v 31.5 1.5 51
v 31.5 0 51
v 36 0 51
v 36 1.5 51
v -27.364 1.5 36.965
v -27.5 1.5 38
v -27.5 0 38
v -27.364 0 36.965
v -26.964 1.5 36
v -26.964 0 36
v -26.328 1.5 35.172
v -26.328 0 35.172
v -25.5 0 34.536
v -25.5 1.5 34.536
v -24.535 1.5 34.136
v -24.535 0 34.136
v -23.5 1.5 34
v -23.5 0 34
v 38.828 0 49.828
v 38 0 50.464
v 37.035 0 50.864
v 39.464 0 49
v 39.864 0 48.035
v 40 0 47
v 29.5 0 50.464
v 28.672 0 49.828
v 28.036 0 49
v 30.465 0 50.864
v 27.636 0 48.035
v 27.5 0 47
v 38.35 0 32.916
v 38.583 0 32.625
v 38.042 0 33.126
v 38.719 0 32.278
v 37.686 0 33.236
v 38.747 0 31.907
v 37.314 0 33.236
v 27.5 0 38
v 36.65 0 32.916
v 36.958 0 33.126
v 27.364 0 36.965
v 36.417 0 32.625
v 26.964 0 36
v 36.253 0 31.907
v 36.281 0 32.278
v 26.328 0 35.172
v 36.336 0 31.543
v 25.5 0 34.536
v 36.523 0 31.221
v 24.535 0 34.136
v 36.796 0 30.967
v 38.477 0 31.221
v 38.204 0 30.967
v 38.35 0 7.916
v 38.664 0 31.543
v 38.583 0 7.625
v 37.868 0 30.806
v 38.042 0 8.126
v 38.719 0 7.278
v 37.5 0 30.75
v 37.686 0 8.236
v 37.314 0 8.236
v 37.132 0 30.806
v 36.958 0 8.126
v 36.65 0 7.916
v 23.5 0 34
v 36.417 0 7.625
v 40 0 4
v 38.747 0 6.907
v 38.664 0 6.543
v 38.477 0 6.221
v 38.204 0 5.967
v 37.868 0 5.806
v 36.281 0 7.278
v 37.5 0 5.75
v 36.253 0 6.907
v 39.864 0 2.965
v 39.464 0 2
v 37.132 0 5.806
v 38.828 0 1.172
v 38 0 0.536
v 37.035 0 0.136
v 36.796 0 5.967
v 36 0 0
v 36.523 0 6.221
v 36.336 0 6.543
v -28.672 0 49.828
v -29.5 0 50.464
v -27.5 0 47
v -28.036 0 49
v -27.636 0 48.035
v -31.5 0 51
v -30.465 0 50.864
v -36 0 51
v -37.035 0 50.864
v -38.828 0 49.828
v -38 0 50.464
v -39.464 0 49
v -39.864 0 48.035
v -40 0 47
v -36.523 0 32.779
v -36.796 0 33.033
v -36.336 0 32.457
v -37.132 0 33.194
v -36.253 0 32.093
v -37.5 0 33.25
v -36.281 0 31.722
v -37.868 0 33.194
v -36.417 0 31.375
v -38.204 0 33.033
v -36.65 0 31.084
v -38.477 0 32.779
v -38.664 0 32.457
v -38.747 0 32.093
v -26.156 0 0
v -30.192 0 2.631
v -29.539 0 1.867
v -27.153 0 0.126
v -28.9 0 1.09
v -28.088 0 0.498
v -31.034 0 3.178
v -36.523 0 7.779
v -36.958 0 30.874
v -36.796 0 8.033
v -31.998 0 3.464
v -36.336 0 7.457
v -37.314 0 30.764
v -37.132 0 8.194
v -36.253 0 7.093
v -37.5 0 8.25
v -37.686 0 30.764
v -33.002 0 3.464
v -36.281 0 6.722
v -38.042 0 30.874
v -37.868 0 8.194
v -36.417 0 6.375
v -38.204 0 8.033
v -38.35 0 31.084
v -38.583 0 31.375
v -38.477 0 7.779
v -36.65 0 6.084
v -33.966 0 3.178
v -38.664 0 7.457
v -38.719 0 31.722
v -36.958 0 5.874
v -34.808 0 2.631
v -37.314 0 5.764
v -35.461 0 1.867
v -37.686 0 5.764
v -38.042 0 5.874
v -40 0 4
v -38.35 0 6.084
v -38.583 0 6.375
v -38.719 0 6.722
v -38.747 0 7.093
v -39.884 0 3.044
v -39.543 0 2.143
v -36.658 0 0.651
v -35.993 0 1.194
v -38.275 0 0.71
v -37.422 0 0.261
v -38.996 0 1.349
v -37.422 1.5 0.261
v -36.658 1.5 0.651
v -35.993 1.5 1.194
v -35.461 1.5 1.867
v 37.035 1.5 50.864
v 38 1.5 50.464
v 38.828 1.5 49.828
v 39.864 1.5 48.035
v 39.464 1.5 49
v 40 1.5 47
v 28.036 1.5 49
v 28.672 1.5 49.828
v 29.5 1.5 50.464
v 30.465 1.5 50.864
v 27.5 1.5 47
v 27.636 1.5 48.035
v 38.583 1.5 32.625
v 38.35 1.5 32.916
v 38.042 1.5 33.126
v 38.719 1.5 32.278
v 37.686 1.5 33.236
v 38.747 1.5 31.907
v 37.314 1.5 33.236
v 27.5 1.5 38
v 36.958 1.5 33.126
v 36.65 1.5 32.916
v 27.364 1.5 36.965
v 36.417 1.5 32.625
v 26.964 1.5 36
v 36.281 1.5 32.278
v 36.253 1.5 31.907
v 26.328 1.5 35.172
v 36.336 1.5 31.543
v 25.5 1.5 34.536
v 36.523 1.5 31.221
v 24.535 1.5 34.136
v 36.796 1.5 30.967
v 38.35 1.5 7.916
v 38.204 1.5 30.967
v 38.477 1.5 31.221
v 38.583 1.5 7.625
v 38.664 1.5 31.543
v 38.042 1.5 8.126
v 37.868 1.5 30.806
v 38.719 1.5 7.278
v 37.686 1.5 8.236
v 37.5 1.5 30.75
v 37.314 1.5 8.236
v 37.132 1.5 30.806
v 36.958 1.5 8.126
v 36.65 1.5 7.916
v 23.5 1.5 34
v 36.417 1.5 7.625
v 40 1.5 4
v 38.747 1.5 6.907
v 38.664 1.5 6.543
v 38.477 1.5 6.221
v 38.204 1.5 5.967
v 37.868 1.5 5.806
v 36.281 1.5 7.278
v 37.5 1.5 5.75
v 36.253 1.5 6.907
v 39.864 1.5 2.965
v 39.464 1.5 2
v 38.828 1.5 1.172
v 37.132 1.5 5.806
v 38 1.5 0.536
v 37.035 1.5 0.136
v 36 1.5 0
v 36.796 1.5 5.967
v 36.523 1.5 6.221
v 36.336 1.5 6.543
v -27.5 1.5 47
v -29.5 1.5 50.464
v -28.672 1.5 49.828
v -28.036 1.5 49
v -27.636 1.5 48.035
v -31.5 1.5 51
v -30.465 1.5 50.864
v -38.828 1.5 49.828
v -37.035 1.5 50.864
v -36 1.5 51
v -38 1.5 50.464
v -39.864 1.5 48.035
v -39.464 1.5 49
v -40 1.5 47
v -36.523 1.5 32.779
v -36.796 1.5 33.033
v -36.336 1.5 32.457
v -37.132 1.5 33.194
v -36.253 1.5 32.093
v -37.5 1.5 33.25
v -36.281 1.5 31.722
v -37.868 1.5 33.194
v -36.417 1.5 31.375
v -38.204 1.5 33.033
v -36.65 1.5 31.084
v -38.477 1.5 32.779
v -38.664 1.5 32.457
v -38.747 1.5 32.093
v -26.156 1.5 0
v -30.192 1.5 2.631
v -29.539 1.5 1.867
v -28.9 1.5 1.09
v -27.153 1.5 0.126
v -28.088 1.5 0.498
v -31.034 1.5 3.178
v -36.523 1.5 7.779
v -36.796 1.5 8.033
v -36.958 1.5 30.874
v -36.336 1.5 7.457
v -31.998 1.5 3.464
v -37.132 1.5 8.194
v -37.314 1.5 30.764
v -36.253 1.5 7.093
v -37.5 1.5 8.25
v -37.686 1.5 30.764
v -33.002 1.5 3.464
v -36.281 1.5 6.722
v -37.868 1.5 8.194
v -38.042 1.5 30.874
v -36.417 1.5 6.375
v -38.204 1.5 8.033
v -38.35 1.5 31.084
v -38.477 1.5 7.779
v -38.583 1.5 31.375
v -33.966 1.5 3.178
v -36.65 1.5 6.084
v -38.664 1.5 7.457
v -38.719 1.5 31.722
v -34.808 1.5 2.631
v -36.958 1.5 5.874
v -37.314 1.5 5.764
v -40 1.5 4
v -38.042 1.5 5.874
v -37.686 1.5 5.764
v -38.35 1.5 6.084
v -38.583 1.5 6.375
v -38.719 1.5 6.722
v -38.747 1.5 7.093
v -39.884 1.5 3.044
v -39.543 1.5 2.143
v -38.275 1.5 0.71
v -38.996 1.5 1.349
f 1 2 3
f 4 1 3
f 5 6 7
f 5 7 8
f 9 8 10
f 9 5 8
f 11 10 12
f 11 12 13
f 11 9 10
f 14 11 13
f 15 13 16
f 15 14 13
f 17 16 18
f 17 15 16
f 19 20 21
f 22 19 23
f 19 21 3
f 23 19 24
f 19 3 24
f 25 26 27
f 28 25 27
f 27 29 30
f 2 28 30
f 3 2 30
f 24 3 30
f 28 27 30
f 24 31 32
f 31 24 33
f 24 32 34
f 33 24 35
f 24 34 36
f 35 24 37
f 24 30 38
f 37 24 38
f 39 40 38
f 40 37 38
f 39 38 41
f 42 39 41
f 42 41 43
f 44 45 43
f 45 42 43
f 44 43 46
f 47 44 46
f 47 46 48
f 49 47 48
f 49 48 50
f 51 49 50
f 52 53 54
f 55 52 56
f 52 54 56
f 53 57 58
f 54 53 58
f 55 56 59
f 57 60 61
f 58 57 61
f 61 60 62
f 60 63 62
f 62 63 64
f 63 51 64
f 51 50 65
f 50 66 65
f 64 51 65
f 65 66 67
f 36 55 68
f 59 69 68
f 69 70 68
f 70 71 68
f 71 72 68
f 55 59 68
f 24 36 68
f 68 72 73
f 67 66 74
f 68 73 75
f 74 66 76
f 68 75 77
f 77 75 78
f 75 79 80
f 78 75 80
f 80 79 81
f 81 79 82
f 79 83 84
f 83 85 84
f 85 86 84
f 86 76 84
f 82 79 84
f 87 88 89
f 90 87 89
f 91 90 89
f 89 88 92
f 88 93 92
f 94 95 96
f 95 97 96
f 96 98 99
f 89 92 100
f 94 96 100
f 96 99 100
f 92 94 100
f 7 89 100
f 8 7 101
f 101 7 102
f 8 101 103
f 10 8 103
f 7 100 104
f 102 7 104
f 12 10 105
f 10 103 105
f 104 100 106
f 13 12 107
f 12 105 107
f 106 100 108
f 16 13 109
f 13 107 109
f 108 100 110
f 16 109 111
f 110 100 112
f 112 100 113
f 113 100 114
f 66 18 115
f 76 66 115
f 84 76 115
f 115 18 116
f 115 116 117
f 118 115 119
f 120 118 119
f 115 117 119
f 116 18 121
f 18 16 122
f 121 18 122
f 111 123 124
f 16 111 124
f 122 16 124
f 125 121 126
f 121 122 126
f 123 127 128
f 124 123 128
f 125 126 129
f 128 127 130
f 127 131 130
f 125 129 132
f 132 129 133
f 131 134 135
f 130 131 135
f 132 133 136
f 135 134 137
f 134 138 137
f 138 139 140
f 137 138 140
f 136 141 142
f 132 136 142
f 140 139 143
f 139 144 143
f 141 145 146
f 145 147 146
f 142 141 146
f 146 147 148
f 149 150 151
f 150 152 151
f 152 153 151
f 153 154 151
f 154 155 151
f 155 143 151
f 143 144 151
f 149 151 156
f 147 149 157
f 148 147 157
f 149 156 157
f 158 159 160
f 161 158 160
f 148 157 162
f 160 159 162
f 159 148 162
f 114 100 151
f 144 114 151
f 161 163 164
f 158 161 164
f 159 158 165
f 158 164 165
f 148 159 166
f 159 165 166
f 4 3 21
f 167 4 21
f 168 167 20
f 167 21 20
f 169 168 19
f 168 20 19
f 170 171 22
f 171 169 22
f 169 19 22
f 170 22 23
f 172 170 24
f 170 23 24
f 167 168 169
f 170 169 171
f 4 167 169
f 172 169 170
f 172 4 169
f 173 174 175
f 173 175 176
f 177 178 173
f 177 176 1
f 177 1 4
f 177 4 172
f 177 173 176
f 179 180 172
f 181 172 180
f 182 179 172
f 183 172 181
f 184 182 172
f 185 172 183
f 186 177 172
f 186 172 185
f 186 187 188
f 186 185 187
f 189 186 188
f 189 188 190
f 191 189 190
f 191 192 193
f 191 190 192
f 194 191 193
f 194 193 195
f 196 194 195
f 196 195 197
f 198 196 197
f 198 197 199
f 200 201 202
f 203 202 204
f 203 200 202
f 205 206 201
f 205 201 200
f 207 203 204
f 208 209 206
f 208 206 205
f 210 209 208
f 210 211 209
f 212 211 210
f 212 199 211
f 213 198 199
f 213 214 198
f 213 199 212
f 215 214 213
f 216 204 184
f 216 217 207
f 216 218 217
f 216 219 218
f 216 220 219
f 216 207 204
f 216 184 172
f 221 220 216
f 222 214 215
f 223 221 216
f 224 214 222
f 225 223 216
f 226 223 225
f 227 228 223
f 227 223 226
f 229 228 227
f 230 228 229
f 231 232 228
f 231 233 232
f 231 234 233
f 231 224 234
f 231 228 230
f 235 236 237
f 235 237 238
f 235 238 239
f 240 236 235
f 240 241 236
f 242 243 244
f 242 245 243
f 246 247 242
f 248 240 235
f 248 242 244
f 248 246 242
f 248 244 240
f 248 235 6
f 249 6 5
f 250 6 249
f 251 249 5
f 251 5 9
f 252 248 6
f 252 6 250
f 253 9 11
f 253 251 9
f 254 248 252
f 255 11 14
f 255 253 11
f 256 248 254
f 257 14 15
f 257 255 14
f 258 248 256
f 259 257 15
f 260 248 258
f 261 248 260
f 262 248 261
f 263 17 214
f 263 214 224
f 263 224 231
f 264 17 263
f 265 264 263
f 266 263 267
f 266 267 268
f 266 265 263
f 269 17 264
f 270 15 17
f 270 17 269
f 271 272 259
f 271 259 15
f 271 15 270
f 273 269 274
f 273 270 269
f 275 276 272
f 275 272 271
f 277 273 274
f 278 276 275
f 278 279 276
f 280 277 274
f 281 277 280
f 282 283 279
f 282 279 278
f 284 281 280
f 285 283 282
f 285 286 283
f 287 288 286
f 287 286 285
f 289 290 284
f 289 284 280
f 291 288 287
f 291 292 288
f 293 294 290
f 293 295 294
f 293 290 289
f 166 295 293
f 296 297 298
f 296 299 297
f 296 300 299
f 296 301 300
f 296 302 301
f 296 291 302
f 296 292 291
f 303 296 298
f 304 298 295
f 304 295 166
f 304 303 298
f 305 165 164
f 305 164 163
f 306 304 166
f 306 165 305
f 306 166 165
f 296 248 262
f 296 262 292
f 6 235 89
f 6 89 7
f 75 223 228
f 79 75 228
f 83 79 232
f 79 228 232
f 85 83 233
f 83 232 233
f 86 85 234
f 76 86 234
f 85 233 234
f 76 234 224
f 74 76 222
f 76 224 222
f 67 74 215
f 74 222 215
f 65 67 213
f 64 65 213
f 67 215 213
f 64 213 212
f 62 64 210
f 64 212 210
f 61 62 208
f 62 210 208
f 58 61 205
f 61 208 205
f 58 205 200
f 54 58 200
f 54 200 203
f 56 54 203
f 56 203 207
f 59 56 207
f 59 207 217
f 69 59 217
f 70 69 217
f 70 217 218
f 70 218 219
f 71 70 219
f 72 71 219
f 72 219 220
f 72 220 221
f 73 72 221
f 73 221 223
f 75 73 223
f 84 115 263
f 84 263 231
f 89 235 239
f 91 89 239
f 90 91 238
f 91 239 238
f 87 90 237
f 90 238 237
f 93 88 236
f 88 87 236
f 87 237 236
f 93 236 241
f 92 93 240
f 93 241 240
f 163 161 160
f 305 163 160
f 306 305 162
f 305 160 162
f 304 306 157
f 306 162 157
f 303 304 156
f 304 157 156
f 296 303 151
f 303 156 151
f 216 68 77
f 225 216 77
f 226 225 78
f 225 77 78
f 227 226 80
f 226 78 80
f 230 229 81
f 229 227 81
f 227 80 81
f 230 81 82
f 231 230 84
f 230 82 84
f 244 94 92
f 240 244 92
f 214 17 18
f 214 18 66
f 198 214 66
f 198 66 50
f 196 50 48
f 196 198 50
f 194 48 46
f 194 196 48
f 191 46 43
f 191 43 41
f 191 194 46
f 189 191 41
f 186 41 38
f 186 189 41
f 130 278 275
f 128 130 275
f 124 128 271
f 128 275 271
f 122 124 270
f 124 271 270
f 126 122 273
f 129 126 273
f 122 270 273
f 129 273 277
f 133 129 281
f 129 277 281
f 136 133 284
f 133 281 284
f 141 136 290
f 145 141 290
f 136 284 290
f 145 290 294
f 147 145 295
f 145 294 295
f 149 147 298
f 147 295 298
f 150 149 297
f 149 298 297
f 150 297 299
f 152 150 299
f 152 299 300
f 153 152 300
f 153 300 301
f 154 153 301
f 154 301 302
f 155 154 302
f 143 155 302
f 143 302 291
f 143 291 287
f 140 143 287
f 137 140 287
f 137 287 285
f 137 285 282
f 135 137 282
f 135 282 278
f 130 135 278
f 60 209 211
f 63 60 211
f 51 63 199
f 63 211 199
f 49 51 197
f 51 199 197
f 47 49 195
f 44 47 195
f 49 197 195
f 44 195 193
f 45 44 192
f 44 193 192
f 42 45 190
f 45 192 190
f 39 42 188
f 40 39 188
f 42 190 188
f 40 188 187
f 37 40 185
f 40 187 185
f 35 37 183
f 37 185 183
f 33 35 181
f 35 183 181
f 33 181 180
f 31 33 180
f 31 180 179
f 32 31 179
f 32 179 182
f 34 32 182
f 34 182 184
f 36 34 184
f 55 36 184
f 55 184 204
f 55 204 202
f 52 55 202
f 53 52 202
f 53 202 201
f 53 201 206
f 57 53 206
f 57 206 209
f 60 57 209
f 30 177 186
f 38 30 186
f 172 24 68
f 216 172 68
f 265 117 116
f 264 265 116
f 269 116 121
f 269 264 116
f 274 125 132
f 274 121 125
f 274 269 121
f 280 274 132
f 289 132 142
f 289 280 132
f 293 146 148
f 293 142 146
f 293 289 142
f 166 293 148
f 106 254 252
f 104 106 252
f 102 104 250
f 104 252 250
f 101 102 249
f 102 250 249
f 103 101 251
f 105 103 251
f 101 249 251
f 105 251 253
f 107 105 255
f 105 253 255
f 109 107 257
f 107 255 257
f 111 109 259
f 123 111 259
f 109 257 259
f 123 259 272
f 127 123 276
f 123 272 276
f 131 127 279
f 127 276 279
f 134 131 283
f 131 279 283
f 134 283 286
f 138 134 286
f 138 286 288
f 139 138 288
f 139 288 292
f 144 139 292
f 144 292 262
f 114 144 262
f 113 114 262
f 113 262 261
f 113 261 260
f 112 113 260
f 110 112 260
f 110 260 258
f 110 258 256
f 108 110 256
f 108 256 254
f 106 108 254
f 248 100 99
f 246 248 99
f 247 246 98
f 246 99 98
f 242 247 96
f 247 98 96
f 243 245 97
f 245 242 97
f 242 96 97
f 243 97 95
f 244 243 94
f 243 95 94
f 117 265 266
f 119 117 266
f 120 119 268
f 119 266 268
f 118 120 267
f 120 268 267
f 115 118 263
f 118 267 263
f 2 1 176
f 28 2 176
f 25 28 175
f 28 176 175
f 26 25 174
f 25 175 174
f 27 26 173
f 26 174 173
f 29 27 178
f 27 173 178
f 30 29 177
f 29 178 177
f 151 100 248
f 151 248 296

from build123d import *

# Parameters (mm, degrees)
ESQUISSE1_W             = 80
ESQUISSE1_H             = 51.00000000000001
BOSS_EXTRU_1_DEPTH      = 1.5
ESQUISSE2_R             = 1.2500000000000047
ESQUISSE2_R_2           = 1.250000000000005
ESQUISSE2_W             = 55.00000000000001
ESQUISSE2_H             = 17
ENL_V_MAT_EXTRU_1_DEPTH = 65.83247642964135
CONG_1_R                = 4


with BuildPart() as part:
    # Esquisse1 → Boss.-Extru.1 (new body)
    with BuildSketch(Plane(origin=(0, 0, 0), x_dir=(1, 0, 0), z_dir=(0, 1, 0))):
        with Locations((0, -25.500000000000004)):
            Rectangle(ESQUISSE1_W, ESQUISSE1_H)
    extrude(amount=BOSS_EXTRU_1_DEPTH)

    # Esquisse2 → Enlèv. mat.-Extru.1 (cut, through all)
    with BuildSketch(Plane(origin=(0, 1.5, 0), x_dir=(1, 0, 0), z_dir=(0, 1, 0))):
        with Locations(Location((-37.5, -32.00000000000001, 0), (0, 0, 270))):
            Circle(ESQUISSE2_R)
        with Locations(Location((-37.5, -7.000000000000006, 0), (0, 0, 270))):
            Circle(ESQUISSE2_R_2)
        with Locations(Location((37.5, -7.000000000000006, 0), (0, 0, 90))):
            Circle(ESQUISSE2_R_2)
        with Locations(Location((37.5, -32.00000000000001, 0), (0, 0, 90))):
            Circle(ESQUISSE2_R)
        with Locations((0, -42.49999999999999)):
            Rectangle(ESQUISSE2_W, ESQUISSE2_H)
        with BuildLine():
            Line((-36.00000000000001, -1.029e-14), (-29.000000000000004, -9.31e-15))
            ThreePointArc((-29.000000000000004, -9.31e-15), (-32.5, -3.5000000000000115), (-36.00000000000001, -1.029e-14))
        make_face()
    extrude(amount=-ENL_V_MAT_EXTRU_1_DEPTH, mode=Mode.SUBTRACT)

    # Congé1
    # the kernel refuses this fillet: 4 mm, written as the material it adds along each edge
    with BuildSketch(Plane(origin=(-27.5, 1.5, 33.99999999999999), x_dir=(0, 0, 1), z_dir=(0, -1, 0))) as cong_1_piece_1:
        with BuildLine():
            CenterArc((CONG_1_R, -CONG_1_R), CONG_1_R, 90, 90)
            Line((0, -CONG_1_R), (0, 0))
            Line((0, 0), (CONG_1_R, 0))
        make_face()
    extrude(amount=1.5)
    with BuildSketch(Plane(origin=(27.5, 1.5, 33.99999999999999), x_dir=(0, 0, 1), z_dir=(0, -1, 0))) as cong_1_piece_2:
        with BuildLine():
            CenterArc((CONG_1_R, CONG_1_R), CONG_1_R, 180, 90)
            Line((0, CONG_1_R), (0, 0))
            Line((0, 0), (CONG_1_R, 0))
        make_face()
    extrude(amount=1.5)
    # the kernel refuses this fillet: 4 mm, written as the material it takes off along each edge
    with BuildSketch(Plane(origin=(-27.5, 11.5, 51), x_dir=(-1, 0, 0), z_dir=(0, -1, 0)), Plane(origin=(40, -10, 51), x_dir=(0, 0, -1), z_dir=(0, 1, 0)), Plane(origin=(-40, -10, 51), x_dir=(1, 0, 0), z_dir=(0, 1, 0))) as cong_1_2_piece_1:
        with BuildLine():
            CenterArc((CONG_1_R, CONG_1_R), CONG_1_R, 180, 90)
            Line((0, CONG_1_R), (0, 0))
            Line((0, 0), (CONG_1_R, 0))
        make_face()
    extrude(amount=21.5, mode=Mode.SUBTRACT)
    with BuildSketch(Plane(origin=(27.5, 11.5, 51), x_dir=(1, 0, 0), z_dir=(0, -1, 0))) as cong_1_2_piece_2:
        with BuildLine():
            CenterArc((CONG_1_R, -CONG_1_R), CONG_1_R, 90, 90)
            Line((0, -CONG_1_R), (0, 0))
            Line((0, 0), (CONG_1_R, 0))
        make_face()
    extrude(amount=21.5, mode=Mode.SUBTRACT)
    with BuildSketch(Plane(origin=(-29, 8.610721925562018, 0), x_dir=(-0.27757416183489847, 0, 0.9607042128988784), z_dir=(0, -1, 0))) as cong_1_2_piece_3:
        with BuildLine():
            CenterArc((3.0533157801839375, -3.842816851595507), CONG_1_R, 106.11547631775109, 57.76904736449852)
            Line((-0.7895010714115829, -2.732520204255937), (0, 0))
            ThreePointArc((0, 0), (0.9715095664221598, -0.13753525485392898), (1.9430191328443203, 7e-17))
        make_face()
    extrude(amount=15.721443851124036, mode=Mode.SUBTRACT)
    with BuildSketch(Plane(origin=(-36, 8.610721925562018, 0), x_dir=(-1, 0, 0), z_dir=(0, -1, 0))) as cong_1_2_piece_4:
        with BuildLine():
            CenterArc((2.844288770224807, -4), CONG_1_R, 90, 57.769047364498164)
            ThreePointArc((-0.5393319072284086, -1.8666666666666827), (-0.1375352548539297, -0.9715095664221669), (0, 0))
            Line((0, 0), (2.844288770224807, 0))
        make_face()
    extrude(amount=15.721443851124036, mode=Mode.SUBTRACT)
    with BuildSketch(Plane(origin=(-40, -10, 0), x_dir=(0, 0, 1), z_dir=(0, 1, 0))) as cong_1_2_piece_5:
        with BuildLine():
            CenterArc((CONG_1_R, CONG_1_R), CONG_1_R, 180, 90)
            Line((-4.4e-16, CONG_1_R), (0, 0))
            Line((0, 0), (CONG_1_R, 0))
        make_face()
    extrude(amount=21.5, mode=Mode.SUBTRACT)
    with BuildSketch(Plane(origin=(40, -10, 0), x_dir=(-1, 0, 0), z_dir=(0, 1, 0))) as cong_1_2_piece_6:
        with BuildLine():
            CenterArc((CONG_1_R, CONG_1_R), CONG_1_R, 180, 90)
            Line((0, CONG_1_R), (0, 0))
            Line((0, 0), (CONG_1_R, 0))
        make_face()
    extrude(amount=21.5, mode=Mode.SUBTRACT)


solid = part.part
